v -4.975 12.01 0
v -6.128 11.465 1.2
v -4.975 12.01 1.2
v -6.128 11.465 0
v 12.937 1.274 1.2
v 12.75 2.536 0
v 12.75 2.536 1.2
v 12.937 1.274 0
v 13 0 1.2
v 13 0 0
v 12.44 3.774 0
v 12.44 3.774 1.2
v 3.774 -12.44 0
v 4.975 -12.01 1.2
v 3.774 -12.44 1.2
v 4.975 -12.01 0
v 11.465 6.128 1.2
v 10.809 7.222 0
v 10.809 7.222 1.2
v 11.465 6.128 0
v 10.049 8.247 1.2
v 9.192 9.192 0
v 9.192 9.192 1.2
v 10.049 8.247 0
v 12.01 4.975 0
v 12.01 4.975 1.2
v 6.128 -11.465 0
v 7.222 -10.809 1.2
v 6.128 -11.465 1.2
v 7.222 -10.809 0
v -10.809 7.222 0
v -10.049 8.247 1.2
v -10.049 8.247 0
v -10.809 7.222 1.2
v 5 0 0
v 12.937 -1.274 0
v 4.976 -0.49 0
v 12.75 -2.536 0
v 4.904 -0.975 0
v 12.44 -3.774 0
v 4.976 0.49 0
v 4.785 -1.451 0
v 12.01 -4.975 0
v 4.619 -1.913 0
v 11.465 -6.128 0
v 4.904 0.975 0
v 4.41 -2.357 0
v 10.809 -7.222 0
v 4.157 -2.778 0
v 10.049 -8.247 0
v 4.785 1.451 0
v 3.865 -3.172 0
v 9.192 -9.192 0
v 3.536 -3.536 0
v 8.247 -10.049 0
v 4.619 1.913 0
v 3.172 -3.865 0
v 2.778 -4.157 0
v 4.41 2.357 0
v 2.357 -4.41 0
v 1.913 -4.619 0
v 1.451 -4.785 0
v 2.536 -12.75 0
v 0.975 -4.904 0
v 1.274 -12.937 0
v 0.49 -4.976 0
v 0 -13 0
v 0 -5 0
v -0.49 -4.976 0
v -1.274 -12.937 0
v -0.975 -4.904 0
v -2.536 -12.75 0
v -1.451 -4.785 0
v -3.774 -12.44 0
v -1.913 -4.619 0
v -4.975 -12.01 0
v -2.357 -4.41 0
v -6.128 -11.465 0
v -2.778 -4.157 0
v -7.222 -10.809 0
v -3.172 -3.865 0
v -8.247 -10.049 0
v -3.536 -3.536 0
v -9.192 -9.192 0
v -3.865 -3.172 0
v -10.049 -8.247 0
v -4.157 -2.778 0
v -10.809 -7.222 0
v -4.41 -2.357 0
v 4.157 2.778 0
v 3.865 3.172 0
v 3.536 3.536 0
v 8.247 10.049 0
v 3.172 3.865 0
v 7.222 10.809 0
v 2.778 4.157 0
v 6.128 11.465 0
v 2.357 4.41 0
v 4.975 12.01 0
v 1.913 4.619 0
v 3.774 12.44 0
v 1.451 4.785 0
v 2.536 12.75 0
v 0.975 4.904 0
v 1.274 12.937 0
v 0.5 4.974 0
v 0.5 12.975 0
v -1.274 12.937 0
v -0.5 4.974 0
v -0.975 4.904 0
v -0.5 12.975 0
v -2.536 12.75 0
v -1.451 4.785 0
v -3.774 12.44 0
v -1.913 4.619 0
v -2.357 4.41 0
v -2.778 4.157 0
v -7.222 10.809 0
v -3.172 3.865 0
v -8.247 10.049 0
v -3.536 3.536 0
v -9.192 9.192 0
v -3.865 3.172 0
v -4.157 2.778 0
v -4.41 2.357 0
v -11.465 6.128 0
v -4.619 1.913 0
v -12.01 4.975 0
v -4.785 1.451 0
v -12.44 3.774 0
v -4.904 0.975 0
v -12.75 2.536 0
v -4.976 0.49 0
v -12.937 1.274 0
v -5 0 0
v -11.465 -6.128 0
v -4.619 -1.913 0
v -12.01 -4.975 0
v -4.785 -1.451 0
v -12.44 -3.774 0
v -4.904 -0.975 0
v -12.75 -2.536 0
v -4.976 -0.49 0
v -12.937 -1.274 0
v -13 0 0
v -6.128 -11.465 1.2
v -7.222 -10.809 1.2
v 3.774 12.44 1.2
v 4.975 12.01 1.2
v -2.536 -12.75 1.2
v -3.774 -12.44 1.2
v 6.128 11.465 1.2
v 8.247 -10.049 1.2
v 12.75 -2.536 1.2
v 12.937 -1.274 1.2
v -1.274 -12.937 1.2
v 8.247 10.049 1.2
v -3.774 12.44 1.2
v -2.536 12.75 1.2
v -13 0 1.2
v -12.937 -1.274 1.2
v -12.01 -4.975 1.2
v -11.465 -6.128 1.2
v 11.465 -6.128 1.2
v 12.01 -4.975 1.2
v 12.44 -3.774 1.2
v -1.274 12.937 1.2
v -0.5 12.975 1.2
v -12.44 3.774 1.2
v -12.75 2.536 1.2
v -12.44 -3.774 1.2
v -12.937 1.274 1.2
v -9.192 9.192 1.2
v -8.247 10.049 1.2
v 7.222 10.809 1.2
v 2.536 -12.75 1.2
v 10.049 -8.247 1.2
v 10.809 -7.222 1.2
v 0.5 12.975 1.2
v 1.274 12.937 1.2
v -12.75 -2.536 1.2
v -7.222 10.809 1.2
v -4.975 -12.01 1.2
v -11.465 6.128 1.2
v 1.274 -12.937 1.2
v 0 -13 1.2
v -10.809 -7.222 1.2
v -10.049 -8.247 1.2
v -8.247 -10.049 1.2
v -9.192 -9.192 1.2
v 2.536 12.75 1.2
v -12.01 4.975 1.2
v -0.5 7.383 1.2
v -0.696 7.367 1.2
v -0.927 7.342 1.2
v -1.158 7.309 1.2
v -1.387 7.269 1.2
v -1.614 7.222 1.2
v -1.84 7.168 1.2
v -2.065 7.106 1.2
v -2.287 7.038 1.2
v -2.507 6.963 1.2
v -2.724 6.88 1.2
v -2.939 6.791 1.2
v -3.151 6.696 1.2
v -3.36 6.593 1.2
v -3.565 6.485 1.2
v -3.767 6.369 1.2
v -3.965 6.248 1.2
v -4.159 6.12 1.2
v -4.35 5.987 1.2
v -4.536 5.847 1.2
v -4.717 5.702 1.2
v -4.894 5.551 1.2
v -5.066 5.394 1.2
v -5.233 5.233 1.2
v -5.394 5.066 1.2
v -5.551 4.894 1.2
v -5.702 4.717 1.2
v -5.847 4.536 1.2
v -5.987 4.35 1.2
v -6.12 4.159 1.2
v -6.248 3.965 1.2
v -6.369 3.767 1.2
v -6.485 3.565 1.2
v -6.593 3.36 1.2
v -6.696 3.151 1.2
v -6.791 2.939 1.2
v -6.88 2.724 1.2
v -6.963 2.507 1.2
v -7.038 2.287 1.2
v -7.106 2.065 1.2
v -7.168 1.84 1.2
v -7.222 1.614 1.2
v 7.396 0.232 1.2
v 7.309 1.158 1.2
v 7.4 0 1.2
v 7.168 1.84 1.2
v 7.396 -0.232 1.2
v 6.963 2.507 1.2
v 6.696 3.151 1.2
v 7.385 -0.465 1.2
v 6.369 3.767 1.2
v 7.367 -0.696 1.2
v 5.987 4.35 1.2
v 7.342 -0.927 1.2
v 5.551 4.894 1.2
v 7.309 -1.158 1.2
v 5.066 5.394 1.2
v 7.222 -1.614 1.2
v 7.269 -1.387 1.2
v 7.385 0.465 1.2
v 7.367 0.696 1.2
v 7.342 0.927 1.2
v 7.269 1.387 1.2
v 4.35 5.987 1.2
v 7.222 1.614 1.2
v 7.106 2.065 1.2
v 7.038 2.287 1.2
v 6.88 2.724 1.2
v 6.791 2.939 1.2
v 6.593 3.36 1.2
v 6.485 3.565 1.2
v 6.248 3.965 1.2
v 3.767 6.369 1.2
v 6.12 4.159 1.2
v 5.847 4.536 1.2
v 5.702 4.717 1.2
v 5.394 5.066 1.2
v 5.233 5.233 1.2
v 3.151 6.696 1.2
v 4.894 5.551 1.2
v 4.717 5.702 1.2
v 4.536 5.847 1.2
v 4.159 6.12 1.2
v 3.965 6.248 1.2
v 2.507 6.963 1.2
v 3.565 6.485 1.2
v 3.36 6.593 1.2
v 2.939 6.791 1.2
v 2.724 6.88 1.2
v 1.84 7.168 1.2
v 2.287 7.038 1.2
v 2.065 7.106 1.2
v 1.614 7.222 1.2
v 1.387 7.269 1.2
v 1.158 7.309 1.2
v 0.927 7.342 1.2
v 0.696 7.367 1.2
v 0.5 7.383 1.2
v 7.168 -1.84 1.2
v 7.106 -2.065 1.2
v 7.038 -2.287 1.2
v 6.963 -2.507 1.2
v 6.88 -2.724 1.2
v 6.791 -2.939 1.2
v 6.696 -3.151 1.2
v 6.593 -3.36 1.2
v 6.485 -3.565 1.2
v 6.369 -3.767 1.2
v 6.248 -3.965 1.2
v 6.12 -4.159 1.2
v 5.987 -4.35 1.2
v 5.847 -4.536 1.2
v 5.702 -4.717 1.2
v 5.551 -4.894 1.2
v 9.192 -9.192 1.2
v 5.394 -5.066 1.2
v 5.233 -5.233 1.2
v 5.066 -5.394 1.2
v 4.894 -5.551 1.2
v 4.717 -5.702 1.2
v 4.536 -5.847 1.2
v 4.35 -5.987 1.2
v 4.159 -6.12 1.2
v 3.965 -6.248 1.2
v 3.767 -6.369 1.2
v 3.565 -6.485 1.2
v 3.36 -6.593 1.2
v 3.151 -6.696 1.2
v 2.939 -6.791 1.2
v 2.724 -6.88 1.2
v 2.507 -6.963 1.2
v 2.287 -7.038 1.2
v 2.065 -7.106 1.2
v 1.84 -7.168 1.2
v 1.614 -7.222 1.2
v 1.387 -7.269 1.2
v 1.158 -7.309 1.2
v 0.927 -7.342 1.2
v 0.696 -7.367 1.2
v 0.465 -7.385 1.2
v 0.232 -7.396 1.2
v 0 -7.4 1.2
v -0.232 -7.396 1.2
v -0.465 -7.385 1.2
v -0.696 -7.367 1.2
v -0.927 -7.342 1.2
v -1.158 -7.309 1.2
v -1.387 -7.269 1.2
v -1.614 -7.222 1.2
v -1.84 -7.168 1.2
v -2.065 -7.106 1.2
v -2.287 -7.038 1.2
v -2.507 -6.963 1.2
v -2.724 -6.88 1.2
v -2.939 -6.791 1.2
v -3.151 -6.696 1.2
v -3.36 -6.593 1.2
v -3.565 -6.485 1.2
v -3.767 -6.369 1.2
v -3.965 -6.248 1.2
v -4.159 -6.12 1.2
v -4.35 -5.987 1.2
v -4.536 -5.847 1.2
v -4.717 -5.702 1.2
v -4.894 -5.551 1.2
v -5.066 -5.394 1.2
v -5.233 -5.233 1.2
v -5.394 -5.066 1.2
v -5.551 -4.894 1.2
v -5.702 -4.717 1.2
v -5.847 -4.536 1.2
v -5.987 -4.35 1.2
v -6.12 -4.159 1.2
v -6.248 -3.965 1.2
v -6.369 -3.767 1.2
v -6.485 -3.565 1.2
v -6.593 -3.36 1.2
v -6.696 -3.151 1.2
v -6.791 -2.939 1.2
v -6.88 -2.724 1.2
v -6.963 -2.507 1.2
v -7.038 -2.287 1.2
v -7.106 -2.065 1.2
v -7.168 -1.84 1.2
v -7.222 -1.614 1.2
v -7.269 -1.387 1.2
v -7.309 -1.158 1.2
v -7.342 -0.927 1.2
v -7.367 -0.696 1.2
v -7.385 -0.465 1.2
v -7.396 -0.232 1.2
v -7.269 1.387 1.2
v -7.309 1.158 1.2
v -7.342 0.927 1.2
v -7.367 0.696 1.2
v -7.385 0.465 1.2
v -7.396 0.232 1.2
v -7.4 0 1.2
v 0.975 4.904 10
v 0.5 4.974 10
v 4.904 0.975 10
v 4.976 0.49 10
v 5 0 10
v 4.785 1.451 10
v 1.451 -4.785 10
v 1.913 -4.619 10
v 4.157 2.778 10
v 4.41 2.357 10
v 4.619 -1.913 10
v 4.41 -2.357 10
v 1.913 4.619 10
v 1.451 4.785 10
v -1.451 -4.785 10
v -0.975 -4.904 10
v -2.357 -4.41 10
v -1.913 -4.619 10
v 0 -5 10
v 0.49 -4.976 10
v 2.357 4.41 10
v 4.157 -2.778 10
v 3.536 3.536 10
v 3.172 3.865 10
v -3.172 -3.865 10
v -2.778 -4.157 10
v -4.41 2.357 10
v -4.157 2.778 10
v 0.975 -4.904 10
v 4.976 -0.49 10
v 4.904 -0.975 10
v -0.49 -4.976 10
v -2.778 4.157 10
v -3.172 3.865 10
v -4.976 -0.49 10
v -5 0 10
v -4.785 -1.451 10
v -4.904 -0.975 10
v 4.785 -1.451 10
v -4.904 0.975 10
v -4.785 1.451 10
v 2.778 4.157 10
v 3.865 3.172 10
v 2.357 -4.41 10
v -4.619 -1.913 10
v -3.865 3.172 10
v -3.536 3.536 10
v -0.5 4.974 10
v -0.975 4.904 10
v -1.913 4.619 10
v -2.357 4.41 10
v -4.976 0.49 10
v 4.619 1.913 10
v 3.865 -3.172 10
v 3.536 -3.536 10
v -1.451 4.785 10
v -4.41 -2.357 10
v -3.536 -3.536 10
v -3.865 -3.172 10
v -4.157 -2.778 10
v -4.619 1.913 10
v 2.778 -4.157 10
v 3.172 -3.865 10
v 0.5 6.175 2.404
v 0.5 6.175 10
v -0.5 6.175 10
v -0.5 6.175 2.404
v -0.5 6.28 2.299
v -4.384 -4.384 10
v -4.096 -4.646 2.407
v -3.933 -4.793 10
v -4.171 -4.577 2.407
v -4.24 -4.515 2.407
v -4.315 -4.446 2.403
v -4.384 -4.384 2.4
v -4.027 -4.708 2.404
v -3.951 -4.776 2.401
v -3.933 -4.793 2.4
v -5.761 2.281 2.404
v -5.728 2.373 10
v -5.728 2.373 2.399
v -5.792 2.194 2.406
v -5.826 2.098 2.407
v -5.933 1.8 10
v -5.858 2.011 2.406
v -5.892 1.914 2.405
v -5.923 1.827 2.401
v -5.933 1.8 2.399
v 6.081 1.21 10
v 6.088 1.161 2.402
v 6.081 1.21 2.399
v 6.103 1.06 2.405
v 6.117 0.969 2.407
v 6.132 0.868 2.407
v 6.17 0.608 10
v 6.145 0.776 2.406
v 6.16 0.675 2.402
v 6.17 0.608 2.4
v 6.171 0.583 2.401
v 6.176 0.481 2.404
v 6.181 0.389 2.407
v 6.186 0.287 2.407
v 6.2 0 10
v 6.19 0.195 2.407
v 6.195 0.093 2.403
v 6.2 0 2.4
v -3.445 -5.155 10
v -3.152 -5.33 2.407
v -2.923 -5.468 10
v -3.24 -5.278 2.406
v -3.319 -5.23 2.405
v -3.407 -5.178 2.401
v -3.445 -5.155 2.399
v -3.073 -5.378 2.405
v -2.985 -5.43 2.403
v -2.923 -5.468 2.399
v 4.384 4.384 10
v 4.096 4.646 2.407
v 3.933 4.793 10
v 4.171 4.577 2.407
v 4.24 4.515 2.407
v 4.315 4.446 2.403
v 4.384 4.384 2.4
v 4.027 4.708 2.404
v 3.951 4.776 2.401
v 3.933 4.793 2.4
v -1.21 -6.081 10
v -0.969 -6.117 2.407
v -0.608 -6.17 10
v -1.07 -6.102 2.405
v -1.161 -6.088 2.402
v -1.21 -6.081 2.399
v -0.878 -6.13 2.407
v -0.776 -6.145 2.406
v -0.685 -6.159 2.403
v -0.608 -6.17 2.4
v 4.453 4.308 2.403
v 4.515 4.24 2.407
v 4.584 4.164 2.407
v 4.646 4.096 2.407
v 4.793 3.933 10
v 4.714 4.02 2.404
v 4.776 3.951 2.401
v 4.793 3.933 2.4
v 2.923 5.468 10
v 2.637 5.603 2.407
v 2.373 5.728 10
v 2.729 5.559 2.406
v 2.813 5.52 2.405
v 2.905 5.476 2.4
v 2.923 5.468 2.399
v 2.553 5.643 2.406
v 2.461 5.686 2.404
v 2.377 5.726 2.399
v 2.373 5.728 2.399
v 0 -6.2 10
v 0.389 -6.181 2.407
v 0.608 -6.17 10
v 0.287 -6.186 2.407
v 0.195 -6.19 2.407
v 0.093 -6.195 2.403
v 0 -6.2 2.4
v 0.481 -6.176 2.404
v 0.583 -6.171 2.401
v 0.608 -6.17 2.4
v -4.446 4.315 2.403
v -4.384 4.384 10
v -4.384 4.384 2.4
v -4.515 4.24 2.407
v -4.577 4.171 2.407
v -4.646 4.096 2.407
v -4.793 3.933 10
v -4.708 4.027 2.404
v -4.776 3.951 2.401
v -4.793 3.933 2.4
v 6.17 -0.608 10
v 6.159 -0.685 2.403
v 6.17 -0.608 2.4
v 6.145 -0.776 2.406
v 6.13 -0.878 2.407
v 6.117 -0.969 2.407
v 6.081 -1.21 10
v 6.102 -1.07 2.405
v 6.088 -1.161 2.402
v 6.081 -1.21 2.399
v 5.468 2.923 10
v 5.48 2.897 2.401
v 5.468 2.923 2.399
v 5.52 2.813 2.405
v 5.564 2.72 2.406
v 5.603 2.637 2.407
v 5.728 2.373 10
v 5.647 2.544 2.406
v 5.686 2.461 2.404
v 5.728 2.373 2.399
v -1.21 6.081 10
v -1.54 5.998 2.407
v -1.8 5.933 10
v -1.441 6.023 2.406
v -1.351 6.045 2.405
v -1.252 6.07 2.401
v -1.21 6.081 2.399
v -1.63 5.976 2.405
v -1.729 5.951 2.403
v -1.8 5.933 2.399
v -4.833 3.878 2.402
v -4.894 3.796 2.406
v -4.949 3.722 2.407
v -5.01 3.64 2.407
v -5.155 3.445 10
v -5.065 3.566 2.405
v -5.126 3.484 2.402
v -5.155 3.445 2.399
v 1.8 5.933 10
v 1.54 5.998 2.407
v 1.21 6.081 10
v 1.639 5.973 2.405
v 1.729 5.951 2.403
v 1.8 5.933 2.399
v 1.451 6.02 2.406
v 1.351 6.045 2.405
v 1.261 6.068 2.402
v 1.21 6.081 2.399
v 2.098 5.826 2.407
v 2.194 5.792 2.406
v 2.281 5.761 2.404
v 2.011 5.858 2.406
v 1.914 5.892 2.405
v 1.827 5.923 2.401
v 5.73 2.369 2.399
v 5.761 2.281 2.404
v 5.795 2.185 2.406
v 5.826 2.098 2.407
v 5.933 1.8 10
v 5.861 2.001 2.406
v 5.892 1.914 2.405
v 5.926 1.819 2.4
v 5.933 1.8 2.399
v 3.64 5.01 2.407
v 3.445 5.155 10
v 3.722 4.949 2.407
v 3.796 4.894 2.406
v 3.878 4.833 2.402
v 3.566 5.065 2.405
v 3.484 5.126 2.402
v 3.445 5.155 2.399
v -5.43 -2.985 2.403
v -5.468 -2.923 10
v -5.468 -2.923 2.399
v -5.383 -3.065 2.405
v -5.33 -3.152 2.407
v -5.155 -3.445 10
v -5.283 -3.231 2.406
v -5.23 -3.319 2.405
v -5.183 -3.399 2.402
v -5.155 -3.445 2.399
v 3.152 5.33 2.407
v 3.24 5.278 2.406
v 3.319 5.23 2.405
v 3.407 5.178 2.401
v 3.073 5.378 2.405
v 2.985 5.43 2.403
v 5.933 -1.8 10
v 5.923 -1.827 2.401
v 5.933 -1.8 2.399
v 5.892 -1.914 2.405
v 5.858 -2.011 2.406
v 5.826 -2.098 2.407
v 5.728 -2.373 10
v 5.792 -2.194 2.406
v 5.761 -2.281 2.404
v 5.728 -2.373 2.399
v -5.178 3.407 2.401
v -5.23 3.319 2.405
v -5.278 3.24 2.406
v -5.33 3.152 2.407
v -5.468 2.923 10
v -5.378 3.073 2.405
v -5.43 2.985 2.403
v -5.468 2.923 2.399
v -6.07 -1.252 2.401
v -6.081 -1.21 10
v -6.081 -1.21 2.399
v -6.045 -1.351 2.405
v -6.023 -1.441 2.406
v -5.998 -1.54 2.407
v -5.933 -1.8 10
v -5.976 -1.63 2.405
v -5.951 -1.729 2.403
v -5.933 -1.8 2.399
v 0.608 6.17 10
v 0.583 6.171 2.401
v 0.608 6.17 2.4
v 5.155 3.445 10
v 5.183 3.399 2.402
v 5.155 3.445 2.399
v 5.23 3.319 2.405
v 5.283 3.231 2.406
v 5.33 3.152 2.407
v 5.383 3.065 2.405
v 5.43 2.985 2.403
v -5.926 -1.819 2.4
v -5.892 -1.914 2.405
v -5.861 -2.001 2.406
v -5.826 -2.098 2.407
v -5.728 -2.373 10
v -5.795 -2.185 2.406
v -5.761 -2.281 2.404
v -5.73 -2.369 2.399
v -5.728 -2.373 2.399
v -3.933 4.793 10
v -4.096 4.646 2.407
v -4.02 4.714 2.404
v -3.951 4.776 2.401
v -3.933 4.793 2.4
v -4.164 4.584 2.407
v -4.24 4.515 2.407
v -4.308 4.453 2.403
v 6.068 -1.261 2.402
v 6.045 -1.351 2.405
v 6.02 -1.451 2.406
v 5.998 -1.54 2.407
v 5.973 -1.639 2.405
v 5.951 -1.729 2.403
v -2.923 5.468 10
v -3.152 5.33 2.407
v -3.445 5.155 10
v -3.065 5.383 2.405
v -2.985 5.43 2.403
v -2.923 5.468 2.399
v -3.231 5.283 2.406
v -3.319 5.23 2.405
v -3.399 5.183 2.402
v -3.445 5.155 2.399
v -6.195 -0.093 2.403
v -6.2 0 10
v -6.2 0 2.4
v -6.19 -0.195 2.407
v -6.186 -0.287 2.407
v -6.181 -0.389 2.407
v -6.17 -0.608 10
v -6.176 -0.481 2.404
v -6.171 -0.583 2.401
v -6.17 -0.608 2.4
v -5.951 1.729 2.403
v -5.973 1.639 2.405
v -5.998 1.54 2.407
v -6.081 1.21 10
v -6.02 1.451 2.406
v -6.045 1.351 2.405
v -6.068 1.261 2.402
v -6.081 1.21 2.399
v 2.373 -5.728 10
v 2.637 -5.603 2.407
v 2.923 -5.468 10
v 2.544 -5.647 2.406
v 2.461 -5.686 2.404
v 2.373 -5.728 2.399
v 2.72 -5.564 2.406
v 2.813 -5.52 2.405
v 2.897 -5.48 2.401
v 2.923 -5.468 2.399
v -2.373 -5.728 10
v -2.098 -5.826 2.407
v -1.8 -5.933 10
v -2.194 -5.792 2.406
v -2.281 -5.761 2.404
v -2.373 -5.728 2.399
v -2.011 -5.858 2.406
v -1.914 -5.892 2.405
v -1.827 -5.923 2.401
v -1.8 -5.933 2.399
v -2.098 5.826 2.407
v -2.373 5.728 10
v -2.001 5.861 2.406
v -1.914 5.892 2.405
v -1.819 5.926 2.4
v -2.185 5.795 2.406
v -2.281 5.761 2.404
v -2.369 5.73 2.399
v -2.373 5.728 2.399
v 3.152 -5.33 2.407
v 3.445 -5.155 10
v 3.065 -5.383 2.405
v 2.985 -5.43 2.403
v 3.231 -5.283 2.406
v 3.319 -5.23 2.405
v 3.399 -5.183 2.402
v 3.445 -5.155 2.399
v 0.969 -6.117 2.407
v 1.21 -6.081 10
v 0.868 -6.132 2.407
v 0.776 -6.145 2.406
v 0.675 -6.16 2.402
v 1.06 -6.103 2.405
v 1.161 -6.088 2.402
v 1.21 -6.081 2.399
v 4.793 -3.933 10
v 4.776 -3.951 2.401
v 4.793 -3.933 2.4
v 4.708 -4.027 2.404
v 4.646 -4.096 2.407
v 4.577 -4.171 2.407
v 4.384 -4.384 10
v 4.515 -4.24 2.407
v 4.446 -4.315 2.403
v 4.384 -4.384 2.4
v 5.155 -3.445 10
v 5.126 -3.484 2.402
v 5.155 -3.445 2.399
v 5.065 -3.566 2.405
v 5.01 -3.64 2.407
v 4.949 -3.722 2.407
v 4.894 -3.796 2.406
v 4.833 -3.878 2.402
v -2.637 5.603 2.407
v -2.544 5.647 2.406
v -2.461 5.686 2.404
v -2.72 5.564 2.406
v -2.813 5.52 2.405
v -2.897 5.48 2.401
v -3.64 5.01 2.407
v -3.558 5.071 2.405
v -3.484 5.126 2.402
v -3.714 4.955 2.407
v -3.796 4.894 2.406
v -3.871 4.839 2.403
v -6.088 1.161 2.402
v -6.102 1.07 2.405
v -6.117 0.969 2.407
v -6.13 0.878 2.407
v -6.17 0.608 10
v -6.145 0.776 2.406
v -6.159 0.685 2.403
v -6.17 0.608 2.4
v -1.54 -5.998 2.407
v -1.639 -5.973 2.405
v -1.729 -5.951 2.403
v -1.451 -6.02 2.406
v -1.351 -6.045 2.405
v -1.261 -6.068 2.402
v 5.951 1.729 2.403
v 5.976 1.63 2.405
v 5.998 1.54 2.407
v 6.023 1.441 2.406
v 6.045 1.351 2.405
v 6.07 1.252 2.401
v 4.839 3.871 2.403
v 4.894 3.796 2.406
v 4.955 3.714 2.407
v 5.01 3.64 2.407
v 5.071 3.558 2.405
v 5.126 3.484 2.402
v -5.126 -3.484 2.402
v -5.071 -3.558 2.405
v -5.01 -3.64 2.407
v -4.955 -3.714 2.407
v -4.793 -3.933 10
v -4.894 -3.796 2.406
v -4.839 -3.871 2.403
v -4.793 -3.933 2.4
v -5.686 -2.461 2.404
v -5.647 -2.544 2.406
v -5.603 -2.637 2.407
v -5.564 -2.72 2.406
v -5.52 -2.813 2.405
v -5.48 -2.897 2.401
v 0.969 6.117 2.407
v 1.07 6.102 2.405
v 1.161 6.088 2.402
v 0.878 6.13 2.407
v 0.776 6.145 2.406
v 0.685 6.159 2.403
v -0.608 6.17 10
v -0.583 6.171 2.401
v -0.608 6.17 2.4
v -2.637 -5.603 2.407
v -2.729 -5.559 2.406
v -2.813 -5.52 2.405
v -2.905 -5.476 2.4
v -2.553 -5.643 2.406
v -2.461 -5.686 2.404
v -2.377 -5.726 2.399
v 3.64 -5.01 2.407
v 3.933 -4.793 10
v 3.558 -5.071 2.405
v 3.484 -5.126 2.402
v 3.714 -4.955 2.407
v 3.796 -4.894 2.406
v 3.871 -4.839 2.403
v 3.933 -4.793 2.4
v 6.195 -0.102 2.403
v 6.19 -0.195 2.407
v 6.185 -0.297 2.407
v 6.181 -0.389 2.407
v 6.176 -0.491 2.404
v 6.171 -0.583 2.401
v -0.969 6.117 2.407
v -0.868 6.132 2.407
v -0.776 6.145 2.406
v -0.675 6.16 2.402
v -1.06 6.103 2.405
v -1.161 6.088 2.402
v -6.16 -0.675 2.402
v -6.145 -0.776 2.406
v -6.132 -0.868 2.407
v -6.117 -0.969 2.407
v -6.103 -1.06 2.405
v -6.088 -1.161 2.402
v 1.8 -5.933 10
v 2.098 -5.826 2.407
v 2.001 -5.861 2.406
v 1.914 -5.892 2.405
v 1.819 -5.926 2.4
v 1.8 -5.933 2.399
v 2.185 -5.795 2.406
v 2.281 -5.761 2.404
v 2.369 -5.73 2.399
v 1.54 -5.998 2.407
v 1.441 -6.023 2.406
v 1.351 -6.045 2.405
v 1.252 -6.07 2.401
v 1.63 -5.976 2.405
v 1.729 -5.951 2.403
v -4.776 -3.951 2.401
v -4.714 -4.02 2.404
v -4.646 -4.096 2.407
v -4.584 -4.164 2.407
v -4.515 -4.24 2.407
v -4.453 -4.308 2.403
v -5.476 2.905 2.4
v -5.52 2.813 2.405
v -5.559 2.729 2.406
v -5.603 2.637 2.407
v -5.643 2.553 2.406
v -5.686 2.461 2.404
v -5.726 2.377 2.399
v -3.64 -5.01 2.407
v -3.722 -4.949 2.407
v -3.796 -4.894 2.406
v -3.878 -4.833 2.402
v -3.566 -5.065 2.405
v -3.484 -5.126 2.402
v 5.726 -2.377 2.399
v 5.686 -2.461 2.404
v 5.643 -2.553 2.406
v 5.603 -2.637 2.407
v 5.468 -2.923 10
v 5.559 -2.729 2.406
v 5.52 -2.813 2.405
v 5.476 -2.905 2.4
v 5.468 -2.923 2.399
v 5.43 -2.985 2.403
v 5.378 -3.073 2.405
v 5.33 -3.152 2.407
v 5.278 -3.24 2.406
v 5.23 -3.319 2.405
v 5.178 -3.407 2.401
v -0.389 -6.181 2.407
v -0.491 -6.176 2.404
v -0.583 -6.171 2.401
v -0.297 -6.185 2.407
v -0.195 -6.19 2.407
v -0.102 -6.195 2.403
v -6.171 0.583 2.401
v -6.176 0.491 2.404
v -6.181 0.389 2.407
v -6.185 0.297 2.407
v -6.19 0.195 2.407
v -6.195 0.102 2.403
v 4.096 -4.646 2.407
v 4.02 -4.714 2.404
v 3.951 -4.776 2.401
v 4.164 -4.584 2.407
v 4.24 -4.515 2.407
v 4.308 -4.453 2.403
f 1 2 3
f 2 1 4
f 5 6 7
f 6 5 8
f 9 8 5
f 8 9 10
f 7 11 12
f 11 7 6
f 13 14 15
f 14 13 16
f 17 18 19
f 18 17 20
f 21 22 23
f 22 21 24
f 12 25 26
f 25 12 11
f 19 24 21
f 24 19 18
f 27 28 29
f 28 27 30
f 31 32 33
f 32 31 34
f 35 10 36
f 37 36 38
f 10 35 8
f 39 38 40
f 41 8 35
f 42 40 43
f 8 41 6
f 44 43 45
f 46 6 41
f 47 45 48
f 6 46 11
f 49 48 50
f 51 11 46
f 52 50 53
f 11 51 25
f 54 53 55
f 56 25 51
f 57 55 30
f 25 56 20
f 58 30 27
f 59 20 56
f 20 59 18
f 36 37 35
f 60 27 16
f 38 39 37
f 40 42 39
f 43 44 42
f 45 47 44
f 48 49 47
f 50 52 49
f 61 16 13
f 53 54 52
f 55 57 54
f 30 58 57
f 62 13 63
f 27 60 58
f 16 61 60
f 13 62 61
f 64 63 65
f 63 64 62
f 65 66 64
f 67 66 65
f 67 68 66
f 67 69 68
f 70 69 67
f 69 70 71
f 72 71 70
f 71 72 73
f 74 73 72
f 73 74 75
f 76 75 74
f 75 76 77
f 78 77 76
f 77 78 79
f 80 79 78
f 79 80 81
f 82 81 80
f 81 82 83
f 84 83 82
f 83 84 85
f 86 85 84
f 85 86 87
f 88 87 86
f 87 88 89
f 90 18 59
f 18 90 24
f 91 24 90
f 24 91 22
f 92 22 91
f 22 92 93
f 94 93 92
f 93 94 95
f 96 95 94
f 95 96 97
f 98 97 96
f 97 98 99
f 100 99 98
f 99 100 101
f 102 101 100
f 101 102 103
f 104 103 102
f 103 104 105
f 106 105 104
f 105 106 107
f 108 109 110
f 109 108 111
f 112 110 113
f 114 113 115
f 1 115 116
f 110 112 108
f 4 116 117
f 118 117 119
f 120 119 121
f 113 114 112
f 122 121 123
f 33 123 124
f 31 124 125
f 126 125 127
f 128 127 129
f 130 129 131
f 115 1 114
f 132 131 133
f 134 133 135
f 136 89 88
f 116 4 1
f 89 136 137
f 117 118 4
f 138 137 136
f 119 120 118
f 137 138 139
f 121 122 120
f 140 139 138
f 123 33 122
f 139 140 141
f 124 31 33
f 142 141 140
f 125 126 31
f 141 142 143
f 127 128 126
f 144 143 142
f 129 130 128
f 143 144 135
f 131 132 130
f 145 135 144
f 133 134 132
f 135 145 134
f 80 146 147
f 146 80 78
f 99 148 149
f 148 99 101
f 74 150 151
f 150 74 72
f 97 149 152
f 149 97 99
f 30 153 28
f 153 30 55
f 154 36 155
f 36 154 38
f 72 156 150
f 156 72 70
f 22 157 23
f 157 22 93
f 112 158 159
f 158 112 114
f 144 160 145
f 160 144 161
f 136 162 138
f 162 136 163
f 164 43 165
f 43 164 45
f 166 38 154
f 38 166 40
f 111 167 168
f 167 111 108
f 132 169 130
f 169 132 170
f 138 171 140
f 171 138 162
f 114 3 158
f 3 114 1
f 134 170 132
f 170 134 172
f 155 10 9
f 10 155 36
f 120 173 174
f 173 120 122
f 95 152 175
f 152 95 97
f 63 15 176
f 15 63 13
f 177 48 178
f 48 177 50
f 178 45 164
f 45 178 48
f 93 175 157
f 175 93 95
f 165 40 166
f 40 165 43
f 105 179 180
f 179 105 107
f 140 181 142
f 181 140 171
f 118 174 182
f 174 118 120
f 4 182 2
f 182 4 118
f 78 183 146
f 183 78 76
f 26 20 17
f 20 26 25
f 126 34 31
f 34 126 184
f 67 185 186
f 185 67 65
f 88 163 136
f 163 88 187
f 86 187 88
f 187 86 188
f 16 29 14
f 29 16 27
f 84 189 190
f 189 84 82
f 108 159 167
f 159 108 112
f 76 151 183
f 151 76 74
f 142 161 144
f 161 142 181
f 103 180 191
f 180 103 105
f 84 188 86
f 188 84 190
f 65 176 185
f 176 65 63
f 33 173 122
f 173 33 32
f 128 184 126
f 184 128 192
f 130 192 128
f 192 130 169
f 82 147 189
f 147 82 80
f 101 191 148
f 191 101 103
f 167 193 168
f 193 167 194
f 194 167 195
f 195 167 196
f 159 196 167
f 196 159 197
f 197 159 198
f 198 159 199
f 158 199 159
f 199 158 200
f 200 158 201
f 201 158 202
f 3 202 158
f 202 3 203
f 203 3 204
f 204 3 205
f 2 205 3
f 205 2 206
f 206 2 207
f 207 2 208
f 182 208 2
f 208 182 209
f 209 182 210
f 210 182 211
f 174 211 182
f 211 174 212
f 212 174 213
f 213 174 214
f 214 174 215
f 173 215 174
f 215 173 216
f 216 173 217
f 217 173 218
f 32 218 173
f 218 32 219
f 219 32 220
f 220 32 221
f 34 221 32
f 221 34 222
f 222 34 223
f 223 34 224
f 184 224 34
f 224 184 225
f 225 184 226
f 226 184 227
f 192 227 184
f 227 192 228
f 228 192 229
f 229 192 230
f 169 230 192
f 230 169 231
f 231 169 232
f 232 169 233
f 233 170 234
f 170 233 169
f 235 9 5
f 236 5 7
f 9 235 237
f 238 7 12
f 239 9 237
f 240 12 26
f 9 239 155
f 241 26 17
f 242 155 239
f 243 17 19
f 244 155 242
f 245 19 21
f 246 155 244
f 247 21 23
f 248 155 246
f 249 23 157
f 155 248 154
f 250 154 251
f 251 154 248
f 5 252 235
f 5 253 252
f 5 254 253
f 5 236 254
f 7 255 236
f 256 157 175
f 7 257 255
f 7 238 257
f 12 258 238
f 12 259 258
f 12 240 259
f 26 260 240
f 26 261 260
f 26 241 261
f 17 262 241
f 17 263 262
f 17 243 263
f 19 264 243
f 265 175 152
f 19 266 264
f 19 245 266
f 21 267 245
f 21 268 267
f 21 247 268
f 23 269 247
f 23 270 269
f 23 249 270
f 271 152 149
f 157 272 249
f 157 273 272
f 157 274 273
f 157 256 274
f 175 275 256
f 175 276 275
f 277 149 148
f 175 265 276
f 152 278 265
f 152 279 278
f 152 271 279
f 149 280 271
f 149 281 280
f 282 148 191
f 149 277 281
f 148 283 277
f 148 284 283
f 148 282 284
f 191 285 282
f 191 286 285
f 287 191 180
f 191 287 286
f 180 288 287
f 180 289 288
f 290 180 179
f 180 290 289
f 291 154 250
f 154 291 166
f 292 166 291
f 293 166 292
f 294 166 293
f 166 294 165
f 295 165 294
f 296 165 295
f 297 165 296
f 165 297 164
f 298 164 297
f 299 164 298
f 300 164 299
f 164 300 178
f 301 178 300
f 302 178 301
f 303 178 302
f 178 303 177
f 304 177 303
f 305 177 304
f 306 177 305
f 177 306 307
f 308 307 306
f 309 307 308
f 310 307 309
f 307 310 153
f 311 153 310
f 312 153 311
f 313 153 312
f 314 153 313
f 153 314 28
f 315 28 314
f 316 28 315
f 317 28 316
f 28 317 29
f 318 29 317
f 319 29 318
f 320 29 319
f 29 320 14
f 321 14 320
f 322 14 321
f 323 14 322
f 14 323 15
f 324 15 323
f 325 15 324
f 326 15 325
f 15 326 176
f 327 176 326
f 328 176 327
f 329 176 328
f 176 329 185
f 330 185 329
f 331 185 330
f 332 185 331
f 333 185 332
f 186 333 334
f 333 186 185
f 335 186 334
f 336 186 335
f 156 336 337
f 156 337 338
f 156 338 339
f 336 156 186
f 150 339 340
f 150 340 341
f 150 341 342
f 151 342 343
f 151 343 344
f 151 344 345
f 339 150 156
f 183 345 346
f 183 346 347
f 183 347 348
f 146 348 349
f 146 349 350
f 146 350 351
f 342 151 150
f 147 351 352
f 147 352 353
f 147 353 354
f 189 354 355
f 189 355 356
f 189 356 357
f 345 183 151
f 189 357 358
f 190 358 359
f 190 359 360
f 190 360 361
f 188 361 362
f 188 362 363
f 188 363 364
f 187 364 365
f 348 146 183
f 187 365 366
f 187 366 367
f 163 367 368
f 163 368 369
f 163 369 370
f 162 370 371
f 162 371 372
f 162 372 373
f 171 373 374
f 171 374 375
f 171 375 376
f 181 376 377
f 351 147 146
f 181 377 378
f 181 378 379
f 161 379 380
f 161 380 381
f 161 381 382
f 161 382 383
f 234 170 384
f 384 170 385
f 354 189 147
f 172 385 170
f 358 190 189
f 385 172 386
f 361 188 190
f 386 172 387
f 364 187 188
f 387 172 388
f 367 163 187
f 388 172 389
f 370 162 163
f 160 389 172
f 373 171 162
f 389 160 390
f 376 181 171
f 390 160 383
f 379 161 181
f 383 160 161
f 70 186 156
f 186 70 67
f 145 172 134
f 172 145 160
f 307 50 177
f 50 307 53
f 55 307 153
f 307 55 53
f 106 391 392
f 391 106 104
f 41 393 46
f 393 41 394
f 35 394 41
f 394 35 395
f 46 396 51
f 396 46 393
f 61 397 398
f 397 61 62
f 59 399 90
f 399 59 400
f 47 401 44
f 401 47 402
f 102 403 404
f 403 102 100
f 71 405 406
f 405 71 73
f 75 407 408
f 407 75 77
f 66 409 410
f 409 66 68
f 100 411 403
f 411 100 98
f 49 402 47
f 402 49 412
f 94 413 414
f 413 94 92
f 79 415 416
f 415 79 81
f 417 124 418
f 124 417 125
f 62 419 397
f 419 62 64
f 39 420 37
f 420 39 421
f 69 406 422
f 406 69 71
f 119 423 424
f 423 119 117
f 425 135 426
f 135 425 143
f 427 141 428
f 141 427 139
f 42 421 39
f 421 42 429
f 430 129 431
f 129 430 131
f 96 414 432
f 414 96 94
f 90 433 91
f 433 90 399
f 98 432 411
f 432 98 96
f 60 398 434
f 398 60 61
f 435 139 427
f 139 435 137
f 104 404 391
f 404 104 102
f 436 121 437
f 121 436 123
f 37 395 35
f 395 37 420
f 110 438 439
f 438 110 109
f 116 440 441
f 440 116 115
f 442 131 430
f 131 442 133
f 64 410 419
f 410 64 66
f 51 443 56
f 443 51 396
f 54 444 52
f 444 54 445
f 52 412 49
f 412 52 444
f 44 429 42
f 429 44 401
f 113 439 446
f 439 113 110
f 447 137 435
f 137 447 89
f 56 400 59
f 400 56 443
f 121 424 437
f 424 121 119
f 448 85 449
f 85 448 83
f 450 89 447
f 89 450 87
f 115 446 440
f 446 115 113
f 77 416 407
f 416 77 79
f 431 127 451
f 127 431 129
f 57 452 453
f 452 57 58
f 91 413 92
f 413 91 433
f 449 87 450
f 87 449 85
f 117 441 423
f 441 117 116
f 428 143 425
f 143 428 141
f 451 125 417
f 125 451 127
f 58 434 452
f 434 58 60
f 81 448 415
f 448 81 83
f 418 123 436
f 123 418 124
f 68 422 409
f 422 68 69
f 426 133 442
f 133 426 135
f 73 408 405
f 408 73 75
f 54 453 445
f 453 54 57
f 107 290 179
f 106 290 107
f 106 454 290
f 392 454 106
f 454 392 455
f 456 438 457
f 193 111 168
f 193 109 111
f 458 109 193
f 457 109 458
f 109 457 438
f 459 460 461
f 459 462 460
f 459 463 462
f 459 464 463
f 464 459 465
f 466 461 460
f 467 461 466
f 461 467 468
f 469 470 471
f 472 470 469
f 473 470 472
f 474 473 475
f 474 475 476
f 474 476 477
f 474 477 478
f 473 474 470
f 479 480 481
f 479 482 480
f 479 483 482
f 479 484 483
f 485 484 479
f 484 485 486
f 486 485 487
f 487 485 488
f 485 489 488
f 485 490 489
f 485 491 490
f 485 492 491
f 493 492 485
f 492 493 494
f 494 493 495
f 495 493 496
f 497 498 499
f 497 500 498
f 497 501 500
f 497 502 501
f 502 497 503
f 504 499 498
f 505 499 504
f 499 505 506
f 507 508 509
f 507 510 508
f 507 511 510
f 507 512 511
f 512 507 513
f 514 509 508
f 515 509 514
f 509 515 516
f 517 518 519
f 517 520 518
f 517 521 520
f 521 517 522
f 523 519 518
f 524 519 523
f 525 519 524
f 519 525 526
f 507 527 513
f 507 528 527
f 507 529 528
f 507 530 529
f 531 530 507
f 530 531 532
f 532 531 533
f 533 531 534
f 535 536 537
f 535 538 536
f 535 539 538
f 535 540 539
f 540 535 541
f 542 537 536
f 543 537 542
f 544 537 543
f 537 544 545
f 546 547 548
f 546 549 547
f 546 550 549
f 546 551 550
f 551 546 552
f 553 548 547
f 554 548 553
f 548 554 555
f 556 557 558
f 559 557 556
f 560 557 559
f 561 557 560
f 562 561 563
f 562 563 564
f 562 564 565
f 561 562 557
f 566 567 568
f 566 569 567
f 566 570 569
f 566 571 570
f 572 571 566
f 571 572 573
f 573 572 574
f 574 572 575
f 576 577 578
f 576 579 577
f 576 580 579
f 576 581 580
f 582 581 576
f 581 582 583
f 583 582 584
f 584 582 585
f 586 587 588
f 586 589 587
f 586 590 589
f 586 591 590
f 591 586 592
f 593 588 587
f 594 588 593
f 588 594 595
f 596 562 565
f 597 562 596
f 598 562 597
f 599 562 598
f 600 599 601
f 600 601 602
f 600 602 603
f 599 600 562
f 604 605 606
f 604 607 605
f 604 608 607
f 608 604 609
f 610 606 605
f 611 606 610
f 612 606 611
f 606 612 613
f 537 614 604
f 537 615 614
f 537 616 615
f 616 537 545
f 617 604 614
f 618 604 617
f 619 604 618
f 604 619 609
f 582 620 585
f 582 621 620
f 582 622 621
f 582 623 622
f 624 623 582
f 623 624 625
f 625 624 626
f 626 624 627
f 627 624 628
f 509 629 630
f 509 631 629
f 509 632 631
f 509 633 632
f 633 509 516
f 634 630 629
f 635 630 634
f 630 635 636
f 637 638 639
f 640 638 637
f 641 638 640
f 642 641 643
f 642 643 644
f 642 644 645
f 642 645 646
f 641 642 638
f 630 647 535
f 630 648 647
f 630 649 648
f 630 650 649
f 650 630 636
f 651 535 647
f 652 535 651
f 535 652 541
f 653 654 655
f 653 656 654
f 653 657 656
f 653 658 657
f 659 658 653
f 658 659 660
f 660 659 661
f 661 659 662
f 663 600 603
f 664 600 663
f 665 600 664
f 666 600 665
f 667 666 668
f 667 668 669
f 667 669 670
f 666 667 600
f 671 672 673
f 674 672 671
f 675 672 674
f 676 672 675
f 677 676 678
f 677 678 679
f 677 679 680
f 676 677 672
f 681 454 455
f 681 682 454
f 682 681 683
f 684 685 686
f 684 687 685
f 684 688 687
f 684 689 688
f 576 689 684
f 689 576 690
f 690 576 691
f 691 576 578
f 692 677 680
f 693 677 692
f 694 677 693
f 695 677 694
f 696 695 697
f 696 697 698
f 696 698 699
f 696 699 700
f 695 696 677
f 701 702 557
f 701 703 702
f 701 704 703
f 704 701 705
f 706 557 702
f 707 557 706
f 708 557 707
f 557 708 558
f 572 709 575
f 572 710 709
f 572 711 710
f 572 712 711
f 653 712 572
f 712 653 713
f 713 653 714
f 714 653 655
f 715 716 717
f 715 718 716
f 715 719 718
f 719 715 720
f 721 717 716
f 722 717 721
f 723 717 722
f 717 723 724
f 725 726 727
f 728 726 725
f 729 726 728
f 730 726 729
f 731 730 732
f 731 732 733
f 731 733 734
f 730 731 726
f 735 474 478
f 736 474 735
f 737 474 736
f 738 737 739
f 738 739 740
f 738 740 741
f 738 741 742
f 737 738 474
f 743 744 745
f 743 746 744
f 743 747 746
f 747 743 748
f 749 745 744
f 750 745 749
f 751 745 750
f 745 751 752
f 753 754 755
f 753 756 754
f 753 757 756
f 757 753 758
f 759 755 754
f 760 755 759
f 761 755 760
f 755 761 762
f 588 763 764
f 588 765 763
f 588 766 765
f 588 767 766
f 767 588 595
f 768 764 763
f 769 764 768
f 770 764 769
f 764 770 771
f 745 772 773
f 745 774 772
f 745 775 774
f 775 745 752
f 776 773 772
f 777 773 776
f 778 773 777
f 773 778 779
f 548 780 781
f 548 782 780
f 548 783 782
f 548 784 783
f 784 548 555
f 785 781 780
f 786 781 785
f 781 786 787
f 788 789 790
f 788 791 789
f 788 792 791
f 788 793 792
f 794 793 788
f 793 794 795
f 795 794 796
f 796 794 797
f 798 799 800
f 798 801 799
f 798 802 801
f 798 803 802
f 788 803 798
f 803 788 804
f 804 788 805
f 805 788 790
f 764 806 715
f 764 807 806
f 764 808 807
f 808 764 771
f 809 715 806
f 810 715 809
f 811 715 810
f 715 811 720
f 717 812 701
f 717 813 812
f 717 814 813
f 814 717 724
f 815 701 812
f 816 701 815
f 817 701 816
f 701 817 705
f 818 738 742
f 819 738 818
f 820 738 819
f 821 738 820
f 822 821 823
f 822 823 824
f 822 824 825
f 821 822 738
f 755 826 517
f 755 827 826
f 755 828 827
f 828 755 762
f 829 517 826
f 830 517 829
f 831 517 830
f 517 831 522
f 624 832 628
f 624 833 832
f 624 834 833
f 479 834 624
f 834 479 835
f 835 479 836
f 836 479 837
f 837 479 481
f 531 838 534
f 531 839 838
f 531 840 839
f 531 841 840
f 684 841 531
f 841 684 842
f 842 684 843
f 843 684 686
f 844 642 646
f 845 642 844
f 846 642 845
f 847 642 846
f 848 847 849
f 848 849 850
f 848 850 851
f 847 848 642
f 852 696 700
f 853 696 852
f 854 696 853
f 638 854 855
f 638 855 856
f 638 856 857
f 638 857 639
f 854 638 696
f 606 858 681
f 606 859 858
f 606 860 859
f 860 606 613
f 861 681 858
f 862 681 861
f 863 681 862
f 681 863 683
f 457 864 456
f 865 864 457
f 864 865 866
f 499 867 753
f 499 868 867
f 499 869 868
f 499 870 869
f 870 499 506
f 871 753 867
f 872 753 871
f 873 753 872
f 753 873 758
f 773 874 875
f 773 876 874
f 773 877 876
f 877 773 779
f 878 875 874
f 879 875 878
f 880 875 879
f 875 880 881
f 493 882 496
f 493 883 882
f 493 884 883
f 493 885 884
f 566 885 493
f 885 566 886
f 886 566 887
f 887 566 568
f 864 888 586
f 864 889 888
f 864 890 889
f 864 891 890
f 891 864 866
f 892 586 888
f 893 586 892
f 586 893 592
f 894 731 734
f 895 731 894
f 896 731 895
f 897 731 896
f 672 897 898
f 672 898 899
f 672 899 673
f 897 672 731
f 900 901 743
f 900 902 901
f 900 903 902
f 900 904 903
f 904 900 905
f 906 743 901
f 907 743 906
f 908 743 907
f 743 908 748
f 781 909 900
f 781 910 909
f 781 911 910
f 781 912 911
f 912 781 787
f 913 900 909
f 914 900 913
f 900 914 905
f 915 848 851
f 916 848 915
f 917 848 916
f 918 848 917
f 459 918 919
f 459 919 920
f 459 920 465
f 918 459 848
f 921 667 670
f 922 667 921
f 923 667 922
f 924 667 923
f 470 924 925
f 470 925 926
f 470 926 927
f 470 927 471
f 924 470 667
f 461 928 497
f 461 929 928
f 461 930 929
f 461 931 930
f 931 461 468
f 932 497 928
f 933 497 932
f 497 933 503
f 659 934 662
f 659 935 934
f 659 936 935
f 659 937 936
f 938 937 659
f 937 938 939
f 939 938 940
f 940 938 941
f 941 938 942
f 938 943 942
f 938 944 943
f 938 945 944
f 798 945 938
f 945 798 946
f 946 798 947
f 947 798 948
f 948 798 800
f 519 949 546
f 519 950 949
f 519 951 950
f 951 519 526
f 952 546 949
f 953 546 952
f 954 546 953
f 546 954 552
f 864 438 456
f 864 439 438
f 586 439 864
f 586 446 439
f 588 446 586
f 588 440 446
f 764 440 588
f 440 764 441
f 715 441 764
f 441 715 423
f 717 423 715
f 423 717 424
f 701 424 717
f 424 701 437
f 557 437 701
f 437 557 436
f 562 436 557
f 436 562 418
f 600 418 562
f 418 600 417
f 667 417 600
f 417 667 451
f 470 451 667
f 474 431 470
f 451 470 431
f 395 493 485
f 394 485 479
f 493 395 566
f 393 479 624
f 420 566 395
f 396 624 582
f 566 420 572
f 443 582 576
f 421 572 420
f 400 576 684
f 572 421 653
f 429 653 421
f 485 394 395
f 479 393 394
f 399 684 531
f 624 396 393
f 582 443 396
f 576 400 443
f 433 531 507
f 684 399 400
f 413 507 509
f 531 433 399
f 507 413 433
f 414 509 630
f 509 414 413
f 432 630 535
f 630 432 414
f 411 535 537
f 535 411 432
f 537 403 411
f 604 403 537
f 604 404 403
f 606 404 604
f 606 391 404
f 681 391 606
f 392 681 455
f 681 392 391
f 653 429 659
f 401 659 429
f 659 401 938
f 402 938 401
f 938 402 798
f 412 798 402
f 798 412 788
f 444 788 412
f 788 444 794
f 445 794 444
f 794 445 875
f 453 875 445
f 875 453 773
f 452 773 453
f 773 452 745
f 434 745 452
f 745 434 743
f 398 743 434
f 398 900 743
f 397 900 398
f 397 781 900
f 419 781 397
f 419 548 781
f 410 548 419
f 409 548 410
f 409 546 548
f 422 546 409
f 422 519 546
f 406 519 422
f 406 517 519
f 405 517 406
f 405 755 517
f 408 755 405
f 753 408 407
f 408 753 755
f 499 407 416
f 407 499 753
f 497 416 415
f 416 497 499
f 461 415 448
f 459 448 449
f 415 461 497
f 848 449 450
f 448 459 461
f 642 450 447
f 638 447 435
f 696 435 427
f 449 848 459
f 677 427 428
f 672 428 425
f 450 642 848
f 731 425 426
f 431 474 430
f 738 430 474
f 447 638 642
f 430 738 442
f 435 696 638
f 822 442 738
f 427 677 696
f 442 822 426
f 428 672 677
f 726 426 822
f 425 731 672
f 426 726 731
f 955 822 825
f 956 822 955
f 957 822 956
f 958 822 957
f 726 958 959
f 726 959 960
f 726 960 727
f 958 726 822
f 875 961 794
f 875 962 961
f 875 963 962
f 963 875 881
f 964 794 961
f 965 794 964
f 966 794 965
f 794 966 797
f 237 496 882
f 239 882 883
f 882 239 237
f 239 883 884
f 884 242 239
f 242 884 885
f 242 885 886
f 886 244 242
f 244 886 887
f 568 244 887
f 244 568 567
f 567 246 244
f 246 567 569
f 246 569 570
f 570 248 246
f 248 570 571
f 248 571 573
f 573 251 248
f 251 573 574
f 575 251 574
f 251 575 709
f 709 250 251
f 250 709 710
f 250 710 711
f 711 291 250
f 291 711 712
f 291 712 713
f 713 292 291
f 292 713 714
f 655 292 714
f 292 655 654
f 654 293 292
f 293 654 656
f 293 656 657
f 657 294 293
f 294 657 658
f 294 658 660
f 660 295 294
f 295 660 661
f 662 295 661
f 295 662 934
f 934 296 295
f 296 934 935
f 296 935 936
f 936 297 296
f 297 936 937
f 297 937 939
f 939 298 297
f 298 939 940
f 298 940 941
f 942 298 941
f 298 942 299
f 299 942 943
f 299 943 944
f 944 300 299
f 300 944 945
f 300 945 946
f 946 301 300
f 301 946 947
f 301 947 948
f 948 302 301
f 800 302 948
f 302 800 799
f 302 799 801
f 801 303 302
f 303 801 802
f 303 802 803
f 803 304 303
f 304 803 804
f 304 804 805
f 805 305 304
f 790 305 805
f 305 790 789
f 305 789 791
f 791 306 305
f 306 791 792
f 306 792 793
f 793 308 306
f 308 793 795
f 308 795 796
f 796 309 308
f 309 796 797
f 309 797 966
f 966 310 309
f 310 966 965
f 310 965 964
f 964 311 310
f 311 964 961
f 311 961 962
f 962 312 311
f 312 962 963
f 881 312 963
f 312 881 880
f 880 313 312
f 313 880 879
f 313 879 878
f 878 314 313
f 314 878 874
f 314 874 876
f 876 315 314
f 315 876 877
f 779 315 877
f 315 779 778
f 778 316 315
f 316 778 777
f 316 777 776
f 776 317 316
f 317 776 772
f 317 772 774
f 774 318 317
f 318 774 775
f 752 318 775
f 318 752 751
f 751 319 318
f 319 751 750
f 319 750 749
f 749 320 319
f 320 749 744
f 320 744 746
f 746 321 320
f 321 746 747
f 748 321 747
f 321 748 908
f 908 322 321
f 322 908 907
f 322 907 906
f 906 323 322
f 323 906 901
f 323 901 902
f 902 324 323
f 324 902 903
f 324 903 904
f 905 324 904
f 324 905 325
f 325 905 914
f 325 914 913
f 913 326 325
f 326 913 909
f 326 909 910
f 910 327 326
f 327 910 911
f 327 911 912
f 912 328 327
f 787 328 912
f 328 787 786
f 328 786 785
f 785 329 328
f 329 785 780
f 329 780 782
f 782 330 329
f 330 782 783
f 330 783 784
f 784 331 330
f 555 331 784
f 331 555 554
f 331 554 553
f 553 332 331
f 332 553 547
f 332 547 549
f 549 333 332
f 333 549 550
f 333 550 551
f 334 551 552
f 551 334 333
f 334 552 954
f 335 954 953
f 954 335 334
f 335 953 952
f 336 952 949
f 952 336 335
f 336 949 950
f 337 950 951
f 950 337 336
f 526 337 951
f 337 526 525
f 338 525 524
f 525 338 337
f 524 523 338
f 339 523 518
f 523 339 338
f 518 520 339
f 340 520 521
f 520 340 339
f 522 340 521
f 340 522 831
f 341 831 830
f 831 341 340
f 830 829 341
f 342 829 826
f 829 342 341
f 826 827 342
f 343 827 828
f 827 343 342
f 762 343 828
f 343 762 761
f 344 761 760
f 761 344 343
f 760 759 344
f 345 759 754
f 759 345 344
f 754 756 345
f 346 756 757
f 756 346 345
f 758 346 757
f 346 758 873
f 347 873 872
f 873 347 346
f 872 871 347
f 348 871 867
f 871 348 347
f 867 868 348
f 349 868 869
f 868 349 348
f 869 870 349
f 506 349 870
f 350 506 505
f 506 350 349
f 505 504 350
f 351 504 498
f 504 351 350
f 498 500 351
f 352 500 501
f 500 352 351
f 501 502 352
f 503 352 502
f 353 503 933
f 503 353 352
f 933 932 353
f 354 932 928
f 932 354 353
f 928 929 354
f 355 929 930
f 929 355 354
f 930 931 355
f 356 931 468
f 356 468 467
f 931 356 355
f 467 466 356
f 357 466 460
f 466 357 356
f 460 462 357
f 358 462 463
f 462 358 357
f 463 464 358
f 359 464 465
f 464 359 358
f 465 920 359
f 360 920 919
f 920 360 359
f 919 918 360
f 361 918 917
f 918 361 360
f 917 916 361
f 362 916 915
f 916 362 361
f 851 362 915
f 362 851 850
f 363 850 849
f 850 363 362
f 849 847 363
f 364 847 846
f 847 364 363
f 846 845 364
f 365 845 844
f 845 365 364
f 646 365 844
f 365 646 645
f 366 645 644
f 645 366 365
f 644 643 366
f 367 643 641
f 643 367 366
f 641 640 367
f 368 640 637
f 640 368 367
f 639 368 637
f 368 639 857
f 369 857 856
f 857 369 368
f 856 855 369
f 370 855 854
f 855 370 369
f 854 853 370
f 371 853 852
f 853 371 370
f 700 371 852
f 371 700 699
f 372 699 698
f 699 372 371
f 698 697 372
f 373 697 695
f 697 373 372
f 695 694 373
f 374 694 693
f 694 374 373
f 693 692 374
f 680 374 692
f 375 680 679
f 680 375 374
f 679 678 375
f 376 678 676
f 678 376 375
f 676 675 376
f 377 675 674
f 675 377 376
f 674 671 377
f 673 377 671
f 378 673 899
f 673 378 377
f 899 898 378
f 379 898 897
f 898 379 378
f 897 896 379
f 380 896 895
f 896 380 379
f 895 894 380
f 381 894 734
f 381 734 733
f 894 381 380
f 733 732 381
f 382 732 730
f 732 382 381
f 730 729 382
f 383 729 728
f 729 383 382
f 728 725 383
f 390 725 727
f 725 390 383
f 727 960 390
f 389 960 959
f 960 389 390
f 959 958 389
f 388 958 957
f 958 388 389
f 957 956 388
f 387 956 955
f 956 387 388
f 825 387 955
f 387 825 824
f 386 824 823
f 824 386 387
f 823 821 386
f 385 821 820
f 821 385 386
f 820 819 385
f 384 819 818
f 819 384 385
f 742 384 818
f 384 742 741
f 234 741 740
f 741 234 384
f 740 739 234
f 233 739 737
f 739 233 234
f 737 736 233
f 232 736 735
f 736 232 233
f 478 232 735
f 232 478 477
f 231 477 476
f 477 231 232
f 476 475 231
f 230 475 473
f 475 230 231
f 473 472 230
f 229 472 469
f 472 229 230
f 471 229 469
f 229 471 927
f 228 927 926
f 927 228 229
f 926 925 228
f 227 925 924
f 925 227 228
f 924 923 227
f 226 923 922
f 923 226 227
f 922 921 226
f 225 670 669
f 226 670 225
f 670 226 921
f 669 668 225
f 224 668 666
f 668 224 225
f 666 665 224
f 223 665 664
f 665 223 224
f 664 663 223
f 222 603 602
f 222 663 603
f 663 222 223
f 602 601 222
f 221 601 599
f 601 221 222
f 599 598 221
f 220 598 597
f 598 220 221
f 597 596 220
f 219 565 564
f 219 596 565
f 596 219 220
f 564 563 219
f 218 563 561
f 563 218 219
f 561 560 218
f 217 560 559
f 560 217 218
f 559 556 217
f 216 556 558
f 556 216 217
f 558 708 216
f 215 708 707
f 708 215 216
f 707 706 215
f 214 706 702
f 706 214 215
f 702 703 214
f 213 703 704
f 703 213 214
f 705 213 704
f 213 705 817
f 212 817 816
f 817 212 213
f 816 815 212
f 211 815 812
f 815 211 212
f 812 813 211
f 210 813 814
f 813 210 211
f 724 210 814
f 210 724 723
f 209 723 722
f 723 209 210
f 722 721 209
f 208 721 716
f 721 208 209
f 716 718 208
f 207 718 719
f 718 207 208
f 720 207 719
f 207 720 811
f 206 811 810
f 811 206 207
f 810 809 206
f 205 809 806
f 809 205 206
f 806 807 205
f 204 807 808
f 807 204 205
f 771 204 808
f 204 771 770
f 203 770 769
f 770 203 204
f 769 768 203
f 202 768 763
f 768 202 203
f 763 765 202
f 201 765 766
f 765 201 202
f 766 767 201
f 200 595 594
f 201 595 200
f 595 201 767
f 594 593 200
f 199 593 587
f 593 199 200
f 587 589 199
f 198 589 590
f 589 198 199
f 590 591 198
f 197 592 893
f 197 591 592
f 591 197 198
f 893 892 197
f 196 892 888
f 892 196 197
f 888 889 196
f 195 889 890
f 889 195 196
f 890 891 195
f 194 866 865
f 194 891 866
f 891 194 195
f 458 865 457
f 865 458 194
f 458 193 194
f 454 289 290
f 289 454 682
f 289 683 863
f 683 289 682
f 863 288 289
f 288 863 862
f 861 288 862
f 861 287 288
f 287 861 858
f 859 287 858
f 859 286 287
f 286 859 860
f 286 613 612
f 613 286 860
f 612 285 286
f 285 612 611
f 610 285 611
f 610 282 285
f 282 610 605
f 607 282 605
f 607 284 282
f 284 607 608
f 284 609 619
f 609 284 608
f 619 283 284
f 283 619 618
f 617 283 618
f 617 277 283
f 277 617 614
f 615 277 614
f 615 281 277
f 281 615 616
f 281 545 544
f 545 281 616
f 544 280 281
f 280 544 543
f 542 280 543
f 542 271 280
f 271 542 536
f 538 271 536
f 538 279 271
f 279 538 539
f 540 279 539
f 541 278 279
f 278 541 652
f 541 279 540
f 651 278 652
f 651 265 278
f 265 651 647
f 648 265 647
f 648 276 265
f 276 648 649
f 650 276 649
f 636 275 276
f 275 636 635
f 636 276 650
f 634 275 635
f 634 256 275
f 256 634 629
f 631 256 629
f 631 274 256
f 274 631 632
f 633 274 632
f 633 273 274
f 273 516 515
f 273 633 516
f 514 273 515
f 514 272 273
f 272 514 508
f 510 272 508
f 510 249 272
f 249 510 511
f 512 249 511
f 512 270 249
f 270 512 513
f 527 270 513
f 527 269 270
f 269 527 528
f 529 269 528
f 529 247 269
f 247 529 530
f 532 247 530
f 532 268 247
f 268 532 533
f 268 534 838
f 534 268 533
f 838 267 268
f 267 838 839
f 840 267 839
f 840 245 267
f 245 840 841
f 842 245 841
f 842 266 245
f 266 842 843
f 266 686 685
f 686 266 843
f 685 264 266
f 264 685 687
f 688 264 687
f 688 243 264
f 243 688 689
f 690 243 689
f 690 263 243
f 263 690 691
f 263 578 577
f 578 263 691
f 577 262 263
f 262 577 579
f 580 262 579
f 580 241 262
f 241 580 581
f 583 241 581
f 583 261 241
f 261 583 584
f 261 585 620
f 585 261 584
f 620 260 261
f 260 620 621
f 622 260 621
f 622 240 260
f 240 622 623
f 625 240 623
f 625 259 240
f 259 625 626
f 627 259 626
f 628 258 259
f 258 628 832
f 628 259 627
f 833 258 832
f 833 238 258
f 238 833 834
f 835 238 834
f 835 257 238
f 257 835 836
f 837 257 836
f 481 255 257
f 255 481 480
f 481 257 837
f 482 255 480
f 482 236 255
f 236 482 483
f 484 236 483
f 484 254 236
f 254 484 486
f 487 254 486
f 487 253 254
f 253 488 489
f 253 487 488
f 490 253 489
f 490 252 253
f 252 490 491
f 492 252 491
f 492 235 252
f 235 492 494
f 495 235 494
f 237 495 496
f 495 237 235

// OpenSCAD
// pen holder for plotting robot

$fn = 64;

// holder variables
penDiameter = 10; // 12.5mm works with Sharpie Fine
                  // 11.75 for Visa-vis
                  // 10 mm for Crayola Washables
penRadius = penDiameter / 2;
barrelHieght = 10;
barrelWallThickness = 3;
baseThickness = 3;
cornerRounding = 2;

hat_thickness = 1.2;

hatDiameter = 26;
slice = 1;


module penHolder(){

	difference(){
		//// lip
        cylinder(hat_thickness, hatDiameter / 2, hatDiameter / 2);
        
        // pen hole
        cylinder(baseThickness, penRadius, penRadius);
        

        // expansion slice
        translate([ -slice / 2, 0, 0])
        cube([  slice, hatDiameter, barrelHieght]); 
	}

	// pen barrel
	difference(){
        // barrel

        barrel();

		// bore
		cylinder(   barrelHieght * 2, penRadius, penRadius);

        
        // expansion slice
        translate([ -slice / 2, 0, 0])
        cube([  slice, hatDiameter * 2, hatDiameter * 2]);   
	};  
}

module barrel()
        union(){{
		cylinder(	barrelHieght, 
					penRadius + hat_thickness, 
					penRadius + hat_thickness);


        rotate_extrude($fn=200)
        //rotate([90, 0, 0])
        translate([-penRadius - 2 * hat_thickness, hat_thickness, 0])
        polygon(points=[[2,2], [2,0], [0,0]]);
        }
    }
//barrel();
penHolder();
